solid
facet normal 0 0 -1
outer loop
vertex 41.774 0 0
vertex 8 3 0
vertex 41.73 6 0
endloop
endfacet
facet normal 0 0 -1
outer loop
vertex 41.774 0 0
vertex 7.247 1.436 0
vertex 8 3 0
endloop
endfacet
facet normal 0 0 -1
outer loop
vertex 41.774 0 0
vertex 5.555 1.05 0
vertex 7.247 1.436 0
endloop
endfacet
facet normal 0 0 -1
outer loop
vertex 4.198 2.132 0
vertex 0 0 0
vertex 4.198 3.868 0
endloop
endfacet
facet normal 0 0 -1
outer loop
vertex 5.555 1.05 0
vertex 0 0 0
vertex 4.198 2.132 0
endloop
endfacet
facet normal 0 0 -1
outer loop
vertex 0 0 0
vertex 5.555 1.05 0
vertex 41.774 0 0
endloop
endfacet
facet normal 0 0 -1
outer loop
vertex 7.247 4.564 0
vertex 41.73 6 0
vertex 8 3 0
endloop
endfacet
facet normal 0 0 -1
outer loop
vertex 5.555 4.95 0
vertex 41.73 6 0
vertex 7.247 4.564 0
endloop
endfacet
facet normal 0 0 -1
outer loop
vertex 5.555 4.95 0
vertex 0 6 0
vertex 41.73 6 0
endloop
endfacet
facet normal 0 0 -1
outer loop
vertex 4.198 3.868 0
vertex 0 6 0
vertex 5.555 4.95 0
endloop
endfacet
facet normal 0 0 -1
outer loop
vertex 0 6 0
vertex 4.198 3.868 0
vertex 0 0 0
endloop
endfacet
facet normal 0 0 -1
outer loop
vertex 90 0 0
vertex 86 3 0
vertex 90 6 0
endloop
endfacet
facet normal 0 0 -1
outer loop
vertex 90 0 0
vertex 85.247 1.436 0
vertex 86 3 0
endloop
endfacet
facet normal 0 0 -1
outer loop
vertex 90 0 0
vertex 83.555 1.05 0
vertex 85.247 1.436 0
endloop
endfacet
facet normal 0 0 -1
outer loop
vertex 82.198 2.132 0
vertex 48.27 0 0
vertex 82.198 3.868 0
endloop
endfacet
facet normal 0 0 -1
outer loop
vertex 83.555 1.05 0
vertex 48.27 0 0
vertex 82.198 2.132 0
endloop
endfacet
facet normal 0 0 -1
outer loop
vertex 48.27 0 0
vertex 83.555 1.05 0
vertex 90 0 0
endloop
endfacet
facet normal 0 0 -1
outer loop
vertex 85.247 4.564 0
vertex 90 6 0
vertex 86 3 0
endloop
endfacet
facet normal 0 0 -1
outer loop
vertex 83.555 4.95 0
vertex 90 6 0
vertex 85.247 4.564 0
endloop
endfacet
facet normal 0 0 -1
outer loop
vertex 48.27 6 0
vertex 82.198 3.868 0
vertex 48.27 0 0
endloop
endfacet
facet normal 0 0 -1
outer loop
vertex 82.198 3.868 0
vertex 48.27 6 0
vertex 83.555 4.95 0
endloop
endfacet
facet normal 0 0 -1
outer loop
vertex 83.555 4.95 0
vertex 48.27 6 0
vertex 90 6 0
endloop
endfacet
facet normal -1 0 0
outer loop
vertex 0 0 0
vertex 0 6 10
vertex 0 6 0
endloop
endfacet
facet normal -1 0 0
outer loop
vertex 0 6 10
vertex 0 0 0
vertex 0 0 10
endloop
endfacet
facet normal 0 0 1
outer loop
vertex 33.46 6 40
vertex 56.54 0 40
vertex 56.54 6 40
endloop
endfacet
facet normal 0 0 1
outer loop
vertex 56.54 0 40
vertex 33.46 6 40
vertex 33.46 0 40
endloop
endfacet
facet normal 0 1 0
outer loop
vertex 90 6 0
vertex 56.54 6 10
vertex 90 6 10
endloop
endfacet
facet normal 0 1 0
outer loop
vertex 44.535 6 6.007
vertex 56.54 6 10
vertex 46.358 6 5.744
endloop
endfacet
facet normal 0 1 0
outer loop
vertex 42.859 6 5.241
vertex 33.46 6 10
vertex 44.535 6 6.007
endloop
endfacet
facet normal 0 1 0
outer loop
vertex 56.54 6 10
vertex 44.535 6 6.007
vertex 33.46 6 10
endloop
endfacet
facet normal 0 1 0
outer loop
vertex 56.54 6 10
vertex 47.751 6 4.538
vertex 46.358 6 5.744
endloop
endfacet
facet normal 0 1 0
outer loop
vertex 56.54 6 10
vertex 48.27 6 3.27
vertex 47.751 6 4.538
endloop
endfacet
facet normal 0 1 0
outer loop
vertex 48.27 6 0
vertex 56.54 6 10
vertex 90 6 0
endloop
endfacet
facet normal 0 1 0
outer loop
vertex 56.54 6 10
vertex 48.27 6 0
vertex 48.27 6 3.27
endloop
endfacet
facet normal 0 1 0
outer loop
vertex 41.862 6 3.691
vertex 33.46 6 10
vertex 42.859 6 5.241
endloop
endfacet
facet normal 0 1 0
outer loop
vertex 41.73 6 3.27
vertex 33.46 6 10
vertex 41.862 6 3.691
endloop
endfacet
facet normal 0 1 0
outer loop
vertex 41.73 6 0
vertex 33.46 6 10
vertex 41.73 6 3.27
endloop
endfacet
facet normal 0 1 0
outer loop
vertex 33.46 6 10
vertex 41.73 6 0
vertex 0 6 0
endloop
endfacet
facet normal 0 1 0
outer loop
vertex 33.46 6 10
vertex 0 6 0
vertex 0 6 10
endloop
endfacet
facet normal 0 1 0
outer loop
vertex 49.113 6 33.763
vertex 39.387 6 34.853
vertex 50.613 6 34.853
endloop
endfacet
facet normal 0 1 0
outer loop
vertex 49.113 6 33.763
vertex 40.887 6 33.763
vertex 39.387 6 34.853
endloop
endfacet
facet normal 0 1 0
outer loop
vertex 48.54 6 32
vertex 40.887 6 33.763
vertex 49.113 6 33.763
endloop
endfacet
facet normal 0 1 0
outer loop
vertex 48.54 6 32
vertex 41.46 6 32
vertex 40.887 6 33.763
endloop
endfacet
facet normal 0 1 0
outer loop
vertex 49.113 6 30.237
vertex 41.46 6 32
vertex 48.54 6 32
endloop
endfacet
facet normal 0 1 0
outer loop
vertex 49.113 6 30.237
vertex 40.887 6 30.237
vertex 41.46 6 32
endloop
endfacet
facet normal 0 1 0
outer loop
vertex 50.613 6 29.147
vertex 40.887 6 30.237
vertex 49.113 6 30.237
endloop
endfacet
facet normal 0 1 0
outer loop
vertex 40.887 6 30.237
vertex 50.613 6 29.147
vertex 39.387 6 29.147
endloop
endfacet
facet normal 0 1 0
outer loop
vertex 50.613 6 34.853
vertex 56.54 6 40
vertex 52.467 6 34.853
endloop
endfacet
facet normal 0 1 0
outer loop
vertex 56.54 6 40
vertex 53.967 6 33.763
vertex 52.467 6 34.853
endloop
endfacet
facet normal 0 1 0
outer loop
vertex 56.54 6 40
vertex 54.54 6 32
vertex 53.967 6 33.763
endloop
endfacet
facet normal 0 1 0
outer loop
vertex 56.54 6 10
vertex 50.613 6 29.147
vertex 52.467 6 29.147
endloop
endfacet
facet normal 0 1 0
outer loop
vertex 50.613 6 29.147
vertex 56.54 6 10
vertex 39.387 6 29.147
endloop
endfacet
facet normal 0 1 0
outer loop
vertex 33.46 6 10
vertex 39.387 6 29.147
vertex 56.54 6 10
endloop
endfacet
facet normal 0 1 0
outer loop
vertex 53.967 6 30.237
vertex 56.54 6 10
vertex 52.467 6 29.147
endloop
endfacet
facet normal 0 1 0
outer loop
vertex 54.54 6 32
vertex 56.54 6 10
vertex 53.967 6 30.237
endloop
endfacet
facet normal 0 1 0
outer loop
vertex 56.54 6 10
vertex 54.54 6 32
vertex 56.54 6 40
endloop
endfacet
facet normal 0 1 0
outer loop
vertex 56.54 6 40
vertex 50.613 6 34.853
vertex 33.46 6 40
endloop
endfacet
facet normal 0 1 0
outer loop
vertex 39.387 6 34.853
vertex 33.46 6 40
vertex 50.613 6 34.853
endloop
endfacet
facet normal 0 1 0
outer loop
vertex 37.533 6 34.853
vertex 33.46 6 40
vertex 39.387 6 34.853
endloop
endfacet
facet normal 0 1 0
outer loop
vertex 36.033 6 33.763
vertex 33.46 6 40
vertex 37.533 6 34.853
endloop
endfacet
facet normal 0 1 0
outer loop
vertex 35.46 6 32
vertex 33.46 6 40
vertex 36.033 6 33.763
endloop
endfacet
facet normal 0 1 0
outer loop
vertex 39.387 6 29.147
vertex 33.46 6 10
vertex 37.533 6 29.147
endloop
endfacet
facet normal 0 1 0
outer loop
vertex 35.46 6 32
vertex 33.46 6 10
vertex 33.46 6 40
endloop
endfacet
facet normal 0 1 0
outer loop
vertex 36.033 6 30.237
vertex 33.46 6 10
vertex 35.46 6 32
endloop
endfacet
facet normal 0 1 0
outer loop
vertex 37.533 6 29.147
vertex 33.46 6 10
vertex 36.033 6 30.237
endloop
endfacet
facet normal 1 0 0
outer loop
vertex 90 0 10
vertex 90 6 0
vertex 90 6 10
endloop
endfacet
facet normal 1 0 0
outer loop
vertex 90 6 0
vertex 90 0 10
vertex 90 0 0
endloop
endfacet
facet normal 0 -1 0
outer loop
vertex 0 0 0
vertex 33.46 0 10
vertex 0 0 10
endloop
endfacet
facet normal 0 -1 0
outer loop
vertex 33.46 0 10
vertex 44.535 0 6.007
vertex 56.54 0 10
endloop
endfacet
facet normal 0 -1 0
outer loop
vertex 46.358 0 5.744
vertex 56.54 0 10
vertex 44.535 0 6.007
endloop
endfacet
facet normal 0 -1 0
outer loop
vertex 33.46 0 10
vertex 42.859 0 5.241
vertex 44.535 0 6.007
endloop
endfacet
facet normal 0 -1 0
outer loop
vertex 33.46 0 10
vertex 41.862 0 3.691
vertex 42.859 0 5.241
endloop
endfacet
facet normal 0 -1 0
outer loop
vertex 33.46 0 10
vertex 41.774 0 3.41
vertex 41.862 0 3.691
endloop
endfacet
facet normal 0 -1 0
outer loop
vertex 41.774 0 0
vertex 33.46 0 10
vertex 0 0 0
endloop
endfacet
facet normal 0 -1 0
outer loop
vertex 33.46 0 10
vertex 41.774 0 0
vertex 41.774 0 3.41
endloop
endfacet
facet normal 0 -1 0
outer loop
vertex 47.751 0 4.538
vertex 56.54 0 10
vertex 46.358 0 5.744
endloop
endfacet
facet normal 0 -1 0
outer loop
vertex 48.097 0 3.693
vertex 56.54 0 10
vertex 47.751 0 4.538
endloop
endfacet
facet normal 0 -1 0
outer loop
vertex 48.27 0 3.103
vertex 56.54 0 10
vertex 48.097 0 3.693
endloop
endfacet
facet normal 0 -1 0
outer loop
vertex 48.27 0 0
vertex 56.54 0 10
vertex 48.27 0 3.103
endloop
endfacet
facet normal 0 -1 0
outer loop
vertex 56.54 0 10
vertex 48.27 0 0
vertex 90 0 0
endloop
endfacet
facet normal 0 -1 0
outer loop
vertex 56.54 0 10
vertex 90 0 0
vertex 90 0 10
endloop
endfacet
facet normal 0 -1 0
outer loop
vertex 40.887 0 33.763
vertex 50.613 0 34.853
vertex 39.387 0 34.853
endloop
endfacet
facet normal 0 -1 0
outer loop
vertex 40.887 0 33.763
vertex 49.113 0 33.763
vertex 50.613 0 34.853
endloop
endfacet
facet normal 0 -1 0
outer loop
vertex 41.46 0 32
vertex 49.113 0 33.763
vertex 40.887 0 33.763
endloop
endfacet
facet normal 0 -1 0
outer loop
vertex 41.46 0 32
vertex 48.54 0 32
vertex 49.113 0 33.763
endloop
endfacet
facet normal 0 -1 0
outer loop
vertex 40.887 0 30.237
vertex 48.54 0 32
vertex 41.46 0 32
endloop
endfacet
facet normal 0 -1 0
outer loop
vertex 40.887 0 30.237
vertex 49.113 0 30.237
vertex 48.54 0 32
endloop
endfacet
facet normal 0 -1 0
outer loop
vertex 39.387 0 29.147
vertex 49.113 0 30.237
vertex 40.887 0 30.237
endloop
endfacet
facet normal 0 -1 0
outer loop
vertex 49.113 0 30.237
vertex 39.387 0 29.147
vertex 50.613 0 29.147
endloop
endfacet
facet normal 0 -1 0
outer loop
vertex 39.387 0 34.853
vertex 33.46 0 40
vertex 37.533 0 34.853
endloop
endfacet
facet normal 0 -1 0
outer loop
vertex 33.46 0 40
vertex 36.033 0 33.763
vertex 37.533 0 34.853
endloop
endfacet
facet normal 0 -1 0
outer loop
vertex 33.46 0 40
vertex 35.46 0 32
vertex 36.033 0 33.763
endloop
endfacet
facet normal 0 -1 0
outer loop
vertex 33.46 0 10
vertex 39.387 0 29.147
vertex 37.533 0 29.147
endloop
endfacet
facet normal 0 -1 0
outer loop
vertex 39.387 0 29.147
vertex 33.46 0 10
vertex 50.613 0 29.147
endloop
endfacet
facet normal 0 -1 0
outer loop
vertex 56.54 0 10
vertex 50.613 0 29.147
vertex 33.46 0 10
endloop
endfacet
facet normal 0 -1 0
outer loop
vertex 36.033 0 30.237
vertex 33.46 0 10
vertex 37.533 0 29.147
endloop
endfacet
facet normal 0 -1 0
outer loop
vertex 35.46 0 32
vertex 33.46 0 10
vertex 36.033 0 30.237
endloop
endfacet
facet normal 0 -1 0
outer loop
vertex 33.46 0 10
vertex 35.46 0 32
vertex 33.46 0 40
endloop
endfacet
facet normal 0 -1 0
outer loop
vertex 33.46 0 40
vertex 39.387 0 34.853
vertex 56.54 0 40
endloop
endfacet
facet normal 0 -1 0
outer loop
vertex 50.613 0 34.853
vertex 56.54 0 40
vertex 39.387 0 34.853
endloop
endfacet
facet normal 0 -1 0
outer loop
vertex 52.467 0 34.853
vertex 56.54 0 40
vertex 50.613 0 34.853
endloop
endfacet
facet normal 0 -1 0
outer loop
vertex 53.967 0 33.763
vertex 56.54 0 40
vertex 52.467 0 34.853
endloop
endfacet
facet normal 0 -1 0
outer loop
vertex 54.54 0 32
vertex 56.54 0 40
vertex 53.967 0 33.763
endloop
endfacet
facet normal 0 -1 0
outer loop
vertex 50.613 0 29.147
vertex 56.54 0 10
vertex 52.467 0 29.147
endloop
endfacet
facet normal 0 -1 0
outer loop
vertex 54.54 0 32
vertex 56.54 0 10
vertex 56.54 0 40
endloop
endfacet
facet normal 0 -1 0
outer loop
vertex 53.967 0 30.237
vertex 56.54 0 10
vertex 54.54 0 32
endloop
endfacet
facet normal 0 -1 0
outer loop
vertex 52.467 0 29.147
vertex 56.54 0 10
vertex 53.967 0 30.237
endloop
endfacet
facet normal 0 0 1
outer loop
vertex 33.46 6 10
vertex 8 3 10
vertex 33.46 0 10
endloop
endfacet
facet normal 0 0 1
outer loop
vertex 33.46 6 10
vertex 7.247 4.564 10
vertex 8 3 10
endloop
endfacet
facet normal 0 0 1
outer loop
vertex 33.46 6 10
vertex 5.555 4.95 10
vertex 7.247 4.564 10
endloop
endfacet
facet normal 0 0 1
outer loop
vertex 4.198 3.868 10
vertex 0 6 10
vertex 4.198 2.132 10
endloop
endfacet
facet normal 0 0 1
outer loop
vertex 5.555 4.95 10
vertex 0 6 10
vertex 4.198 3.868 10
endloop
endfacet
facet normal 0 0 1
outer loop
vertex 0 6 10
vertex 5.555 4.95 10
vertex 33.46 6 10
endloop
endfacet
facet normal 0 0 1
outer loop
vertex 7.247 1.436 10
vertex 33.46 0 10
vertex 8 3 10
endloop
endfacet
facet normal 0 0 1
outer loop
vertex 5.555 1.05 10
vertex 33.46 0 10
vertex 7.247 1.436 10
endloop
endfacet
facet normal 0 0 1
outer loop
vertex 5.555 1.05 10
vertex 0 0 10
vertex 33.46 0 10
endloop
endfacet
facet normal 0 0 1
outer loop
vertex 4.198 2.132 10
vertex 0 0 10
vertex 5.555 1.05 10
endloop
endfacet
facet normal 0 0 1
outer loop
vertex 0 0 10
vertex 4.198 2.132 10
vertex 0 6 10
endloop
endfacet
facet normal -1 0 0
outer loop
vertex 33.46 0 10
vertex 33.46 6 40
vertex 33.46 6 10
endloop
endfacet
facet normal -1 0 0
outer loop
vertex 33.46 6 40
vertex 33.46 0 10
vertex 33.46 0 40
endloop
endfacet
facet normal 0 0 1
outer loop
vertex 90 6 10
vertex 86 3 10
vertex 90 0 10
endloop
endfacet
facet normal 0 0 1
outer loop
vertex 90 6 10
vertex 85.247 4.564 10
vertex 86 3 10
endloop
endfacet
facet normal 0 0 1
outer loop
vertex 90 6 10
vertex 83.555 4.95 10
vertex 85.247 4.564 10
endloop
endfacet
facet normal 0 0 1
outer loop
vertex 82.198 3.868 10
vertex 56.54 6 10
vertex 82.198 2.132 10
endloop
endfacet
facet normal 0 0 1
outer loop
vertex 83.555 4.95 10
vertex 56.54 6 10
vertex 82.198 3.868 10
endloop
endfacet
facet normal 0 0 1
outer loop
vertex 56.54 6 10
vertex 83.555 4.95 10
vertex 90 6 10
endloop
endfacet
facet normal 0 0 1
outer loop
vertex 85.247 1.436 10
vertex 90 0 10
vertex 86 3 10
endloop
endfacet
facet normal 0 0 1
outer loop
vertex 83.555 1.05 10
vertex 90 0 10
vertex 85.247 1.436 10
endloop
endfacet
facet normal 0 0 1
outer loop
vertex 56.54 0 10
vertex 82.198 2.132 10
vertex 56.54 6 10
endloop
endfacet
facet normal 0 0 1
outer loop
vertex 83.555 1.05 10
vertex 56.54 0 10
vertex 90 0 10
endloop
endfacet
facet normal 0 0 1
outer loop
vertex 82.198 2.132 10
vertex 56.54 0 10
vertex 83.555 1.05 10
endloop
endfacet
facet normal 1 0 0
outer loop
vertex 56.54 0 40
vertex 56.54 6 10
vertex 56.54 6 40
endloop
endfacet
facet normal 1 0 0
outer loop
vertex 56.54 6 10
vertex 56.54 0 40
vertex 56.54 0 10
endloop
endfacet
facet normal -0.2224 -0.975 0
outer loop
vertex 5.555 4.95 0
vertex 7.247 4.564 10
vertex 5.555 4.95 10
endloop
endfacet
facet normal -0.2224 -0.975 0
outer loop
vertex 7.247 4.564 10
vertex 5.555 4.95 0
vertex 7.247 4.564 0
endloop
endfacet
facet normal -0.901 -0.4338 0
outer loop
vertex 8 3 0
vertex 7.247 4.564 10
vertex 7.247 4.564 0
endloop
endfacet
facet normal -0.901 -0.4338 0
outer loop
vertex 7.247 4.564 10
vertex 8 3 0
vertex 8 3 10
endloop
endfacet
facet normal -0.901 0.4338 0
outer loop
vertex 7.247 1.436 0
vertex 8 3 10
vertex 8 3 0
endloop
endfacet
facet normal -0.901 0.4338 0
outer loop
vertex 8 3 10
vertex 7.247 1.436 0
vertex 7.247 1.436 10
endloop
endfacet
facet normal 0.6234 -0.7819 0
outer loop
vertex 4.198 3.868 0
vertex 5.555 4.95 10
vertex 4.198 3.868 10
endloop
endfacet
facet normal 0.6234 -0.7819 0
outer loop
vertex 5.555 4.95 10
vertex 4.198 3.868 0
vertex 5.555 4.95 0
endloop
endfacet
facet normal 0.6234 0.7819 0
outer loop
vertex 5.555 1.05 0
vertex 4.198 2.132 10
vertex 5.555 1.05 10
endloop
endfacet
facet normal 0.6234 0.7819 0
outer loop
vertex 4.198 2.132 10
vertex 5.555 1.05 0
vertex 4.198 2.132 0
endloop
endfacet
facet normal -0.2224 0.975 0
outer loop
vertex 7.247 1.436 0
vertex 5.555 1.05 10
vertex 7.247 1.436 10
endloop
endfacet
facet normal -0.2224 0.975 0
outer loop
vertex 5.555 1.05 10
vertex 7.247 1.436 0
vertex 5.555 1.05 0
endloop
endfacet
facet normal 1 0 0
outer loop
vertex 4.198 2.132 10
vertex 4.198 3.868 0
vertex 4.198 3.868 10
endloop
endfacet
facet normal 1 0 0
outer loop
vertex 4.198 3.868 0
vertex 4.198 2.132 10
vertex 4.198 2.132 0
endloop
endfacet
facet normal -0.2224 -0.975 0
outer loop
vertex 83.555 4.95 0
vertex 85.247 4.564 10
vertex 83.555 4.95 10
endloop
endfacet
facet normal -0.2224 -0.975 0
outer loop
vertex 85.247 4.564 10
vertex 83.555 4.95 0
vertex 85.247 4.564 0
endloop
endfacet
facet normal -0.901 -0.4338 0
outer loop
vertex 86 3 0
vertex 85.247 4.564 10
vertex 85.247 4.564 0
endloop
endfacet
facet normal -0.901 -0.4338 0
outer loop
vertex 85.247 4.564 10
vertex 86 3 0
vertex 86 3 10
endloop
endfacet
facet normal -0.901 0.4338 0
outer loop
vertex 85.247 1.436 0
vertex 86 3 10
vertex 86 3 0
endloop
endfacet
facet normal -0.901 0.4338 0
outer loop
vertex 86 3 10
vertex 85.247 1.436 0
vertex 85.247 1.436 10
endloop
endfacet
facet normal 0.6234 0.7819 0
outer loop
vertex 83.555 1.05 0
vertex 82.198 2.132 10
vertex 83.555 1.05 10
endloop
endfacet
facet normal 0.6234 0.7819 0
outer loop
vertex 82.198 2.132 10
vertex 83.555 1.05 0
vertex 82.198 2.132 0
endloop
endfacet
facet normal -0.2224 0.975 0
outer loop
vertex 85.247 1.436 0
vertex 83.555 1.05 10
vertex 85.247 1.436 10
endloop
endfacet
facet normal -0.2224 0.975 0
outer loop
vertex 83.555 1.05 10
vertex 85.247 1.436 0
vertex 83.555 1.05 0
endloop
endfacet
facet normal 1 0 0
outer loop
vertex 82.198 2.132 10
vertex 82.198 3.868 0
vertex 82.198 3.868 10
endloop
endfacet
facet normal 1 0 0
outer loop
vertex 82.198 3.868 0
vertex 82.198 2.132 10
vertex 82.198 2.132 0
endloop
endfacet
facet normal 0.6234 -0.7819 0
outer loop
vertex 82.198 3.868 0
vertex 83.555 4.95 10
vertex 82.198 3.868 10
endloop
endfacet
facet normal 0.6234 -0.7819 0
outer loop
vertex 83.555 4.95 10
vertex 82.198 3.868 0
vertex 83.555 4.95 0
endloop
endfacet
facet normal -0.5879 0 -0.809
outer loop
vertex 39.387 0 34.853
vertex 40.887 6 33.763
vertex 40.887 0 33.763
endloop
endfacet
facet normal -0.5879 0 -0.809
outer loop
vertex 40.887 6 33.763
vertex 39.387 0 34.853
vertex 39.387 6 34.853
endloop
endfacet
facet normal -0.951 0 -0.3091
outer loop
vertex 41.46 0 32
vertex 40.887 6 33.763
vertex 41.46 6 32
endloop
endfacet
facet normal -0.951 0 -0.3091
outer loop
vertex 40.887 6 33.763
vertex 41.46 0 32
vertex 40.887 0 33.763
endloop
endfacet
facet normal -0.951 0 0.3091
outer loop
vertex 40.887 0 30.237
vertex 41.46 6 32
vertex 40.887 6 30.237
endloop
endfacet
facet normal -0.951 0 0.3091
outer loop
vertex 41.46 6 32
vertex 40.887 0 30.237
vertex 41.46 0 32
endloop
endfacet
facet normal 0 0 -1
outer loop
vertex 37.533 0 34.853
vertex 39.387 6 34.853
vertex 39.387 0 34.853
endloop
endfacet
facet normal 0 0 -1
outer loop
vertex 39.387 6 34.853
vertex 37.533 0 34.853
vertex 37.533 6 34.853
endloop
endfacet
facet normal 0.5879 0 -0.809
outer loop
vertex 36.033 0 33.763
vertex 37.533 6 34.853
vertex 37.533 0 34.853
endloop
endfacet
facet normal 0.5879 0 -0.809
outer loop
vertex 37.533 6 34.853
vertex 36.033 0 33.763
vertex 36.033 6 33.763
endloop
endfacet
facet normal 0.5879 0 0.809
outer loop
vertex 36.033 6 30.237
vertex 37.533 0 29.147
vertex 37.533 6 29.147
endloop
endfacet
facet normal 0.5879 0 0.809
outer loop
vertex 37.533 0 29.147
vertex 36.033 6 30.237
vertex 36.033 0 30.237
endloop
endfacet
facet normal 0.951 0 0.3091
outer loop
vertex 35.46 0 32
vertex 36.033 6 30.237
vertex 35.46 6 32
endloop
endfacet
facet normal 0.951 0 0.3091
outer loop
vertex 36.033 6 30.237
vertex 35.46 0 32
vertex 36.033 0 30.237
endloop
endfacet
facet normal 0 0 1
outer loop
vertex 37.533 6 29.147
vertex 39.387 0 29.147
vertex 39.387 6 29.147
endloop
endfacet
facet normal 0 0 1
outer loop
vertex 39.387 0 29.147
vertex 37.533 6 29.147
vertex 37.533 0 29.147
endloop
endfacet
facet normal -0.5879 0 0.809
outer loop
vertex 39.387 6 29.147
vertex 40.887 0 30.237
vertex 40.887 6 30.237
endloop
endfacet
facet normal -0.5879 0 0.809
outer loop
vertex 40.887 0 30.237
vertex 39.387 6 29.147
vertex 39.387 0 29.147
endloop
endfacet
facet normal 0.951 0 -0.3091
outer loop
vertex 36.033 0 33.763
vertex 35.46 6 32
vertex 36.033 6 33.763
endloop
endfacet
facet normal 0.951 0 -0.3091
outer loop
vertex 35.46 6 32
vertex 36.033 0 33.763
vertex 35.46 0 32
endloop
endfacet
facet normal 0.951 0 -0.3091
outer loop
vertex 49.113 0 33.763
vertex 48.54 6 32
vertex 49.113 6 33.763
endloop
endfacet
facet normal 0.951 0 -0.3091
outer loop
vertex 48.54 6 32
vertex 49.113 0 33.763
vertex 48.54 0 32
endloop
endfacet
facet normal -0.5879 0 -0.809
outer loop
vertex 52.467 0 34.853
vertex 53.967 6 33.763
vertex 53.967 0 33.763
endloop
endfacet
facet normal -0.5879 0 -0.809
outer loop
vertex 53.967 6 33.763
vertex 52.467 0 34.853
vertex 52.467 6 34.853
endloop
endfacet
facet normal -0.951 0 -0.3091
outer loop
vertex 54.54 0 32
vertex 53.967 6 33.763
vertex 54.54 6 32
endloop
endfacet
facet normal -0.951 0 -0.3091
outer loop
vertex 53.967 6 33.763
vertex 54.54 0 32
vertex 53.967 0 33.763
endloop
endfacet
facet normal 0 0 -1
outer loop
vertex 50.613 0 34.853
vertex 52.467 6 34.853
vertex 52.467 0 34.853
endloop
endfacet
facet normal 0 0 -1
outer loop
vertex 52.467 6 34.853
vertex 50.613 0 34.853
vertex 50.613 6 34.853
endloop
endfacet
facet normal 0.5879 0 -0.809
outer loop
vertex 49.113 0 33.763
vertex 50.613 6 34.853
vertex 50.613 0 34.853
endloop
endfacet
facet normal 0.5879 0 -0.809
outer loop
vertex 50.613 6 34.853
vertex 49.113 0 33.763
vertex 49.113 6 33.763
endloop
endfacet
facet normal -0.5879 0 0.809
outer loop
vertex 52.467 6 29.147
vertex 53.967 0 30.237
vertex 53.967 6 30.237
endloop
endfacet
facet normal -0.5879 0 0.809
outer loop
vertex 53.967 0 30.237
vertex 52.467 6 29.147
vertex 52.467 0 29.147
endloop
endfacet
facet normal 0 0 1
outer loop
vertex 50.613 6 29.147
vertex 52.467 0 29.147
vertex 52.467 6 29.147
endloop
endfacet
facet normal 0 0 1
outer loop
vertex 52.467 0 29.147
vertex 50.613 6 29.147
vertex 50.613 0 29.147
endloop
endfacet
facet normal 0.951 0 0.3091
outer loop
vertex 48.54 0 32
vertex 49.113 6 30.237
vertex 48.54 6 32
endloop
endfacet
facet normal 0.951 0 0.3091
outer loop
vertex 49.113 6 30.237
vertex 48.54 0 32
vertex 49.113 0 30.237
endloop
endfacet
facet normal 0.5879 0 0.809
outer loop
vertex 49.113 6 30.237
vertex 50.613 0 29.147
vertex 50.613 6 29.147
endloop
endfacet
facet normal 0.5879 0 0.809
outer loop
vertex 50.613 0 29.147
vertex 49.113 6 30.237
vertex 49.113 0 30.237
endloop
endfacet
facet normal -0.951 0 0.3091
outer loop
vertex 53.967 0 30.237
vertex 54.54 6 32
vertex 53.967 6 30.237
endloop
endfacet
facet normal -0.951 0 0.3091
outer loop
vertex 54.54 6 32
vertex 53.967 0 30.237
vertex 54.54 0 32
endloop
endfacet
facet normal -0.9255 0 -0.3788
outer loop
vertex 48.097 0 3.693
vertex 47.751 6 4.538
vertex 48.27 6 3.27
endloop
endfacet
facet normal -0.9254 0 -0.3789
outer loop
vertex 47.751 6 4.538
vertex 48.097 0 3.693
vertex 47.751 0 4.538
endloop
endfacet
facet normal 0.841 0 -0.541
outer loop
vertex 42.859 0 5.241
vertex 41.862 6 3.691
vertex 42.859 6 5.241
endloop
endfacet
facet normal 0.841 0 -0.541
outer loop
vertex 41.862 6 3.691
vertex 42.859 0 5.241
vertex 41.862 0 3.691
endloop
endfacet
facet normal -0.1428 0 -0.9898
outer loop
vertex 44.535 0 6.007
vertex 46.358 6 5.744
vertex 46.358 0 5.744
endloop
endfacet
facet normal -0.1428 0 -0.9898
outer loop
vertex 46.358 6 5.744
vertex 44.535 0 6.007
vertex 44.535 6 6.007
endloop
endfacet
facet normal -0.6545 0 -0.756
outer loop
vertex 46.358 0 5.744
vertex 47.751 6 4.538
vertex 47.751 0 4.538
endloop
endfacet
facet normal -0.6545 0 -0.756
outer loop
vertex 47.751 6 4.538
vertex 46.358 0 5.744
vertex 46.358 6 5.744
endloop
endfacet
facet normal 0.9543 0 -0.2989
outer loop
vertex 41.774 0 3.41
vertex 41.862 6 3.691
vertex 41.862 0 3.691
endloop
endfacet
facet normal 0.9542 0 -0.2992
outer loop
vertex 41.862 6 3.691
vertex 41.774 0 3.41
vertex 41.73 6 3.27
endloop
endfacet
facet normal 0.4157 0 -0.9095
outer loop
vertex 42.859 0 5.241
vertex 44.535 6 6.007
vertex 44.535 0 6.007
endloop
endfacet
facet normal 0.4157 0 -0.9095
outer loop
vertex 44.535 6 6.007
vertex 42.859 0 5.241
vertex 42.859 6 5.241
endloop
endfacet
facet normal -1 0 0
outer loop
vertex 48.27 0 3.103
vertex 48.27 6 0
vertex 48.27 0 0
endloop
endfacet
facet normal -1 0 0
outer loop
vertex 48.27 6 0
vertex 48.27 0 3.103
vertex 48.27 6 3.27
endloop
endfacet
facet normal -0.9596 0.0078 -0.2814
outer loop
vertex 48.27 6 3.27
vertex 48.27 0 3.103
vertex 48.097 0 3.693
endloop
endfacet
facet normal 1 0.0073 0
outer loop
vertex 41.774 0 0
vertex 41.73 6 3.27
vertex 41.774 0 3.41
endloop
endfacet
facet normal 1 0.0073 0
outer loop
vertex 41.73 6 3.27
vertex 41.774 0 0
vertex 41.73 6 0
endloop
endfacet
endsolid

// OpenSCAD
//********************
syringediameter= 6.54;

//Large and medium
//sideflapwidth= 90- syringediameter - 45;
//Small
sideflapwidth= 90- syringediameter - 50;

widthofpart=6; //10 for largest, 6 for small and medium

//***************

syringeradius= syringediameter/2;


difference(){
translate([0,0,20])
    linear_extrude(
    height = 40, 
    center = true, 
    convexity = 10, 
    twist = 0)
    square([90,widthofpart]);
    
//Origin box    
translate([0,0,25])
    linear_extrude(
    height = 30, 
    center = true, 
    convexity = 10, 
    twist = 0)
    square([sideflapwidth,widthofpart]);
    
//Right side box
translate([90- sideflapwidth,0,25])
    linear_extrude(
    height = 30, 
    center = true, 
    convexity = 10, 
    twist = 0)
    square([sideflapwidth,widthofpart]);
    
//Origin woodscrew
translate([6, widthofpart/2, 0])
cylinder (h=widthofpart+5, r=2);

//Right woodscrew
translate([90-6, widthofpart/2, 0])
cylinder (h=widthofpart+5, r=2);

//Top origin screw
translate([sideflapwidth+5, widthofpart, 32])
rotate([90,0,0])
cylinder (h=widthofpart*2, r=3);

//Top right screw
translate([90-sideflapwidth-5, widthofpart, 32])
rotate([90,0,0])
cylinder (h=widthofpart*2, r=3);


hull(){
//Center hole circle
translate([45, widthofpart, syringeradius-0.5])
rotate([90,0,0])
cylinder (h=widthofpart*3, r=syringeradius);
     

//center hole square  
translate([45-syringeradius,widthofpart, -10])
    cube([syringeradius*2,10, syringeradius+10]); 
}

}
